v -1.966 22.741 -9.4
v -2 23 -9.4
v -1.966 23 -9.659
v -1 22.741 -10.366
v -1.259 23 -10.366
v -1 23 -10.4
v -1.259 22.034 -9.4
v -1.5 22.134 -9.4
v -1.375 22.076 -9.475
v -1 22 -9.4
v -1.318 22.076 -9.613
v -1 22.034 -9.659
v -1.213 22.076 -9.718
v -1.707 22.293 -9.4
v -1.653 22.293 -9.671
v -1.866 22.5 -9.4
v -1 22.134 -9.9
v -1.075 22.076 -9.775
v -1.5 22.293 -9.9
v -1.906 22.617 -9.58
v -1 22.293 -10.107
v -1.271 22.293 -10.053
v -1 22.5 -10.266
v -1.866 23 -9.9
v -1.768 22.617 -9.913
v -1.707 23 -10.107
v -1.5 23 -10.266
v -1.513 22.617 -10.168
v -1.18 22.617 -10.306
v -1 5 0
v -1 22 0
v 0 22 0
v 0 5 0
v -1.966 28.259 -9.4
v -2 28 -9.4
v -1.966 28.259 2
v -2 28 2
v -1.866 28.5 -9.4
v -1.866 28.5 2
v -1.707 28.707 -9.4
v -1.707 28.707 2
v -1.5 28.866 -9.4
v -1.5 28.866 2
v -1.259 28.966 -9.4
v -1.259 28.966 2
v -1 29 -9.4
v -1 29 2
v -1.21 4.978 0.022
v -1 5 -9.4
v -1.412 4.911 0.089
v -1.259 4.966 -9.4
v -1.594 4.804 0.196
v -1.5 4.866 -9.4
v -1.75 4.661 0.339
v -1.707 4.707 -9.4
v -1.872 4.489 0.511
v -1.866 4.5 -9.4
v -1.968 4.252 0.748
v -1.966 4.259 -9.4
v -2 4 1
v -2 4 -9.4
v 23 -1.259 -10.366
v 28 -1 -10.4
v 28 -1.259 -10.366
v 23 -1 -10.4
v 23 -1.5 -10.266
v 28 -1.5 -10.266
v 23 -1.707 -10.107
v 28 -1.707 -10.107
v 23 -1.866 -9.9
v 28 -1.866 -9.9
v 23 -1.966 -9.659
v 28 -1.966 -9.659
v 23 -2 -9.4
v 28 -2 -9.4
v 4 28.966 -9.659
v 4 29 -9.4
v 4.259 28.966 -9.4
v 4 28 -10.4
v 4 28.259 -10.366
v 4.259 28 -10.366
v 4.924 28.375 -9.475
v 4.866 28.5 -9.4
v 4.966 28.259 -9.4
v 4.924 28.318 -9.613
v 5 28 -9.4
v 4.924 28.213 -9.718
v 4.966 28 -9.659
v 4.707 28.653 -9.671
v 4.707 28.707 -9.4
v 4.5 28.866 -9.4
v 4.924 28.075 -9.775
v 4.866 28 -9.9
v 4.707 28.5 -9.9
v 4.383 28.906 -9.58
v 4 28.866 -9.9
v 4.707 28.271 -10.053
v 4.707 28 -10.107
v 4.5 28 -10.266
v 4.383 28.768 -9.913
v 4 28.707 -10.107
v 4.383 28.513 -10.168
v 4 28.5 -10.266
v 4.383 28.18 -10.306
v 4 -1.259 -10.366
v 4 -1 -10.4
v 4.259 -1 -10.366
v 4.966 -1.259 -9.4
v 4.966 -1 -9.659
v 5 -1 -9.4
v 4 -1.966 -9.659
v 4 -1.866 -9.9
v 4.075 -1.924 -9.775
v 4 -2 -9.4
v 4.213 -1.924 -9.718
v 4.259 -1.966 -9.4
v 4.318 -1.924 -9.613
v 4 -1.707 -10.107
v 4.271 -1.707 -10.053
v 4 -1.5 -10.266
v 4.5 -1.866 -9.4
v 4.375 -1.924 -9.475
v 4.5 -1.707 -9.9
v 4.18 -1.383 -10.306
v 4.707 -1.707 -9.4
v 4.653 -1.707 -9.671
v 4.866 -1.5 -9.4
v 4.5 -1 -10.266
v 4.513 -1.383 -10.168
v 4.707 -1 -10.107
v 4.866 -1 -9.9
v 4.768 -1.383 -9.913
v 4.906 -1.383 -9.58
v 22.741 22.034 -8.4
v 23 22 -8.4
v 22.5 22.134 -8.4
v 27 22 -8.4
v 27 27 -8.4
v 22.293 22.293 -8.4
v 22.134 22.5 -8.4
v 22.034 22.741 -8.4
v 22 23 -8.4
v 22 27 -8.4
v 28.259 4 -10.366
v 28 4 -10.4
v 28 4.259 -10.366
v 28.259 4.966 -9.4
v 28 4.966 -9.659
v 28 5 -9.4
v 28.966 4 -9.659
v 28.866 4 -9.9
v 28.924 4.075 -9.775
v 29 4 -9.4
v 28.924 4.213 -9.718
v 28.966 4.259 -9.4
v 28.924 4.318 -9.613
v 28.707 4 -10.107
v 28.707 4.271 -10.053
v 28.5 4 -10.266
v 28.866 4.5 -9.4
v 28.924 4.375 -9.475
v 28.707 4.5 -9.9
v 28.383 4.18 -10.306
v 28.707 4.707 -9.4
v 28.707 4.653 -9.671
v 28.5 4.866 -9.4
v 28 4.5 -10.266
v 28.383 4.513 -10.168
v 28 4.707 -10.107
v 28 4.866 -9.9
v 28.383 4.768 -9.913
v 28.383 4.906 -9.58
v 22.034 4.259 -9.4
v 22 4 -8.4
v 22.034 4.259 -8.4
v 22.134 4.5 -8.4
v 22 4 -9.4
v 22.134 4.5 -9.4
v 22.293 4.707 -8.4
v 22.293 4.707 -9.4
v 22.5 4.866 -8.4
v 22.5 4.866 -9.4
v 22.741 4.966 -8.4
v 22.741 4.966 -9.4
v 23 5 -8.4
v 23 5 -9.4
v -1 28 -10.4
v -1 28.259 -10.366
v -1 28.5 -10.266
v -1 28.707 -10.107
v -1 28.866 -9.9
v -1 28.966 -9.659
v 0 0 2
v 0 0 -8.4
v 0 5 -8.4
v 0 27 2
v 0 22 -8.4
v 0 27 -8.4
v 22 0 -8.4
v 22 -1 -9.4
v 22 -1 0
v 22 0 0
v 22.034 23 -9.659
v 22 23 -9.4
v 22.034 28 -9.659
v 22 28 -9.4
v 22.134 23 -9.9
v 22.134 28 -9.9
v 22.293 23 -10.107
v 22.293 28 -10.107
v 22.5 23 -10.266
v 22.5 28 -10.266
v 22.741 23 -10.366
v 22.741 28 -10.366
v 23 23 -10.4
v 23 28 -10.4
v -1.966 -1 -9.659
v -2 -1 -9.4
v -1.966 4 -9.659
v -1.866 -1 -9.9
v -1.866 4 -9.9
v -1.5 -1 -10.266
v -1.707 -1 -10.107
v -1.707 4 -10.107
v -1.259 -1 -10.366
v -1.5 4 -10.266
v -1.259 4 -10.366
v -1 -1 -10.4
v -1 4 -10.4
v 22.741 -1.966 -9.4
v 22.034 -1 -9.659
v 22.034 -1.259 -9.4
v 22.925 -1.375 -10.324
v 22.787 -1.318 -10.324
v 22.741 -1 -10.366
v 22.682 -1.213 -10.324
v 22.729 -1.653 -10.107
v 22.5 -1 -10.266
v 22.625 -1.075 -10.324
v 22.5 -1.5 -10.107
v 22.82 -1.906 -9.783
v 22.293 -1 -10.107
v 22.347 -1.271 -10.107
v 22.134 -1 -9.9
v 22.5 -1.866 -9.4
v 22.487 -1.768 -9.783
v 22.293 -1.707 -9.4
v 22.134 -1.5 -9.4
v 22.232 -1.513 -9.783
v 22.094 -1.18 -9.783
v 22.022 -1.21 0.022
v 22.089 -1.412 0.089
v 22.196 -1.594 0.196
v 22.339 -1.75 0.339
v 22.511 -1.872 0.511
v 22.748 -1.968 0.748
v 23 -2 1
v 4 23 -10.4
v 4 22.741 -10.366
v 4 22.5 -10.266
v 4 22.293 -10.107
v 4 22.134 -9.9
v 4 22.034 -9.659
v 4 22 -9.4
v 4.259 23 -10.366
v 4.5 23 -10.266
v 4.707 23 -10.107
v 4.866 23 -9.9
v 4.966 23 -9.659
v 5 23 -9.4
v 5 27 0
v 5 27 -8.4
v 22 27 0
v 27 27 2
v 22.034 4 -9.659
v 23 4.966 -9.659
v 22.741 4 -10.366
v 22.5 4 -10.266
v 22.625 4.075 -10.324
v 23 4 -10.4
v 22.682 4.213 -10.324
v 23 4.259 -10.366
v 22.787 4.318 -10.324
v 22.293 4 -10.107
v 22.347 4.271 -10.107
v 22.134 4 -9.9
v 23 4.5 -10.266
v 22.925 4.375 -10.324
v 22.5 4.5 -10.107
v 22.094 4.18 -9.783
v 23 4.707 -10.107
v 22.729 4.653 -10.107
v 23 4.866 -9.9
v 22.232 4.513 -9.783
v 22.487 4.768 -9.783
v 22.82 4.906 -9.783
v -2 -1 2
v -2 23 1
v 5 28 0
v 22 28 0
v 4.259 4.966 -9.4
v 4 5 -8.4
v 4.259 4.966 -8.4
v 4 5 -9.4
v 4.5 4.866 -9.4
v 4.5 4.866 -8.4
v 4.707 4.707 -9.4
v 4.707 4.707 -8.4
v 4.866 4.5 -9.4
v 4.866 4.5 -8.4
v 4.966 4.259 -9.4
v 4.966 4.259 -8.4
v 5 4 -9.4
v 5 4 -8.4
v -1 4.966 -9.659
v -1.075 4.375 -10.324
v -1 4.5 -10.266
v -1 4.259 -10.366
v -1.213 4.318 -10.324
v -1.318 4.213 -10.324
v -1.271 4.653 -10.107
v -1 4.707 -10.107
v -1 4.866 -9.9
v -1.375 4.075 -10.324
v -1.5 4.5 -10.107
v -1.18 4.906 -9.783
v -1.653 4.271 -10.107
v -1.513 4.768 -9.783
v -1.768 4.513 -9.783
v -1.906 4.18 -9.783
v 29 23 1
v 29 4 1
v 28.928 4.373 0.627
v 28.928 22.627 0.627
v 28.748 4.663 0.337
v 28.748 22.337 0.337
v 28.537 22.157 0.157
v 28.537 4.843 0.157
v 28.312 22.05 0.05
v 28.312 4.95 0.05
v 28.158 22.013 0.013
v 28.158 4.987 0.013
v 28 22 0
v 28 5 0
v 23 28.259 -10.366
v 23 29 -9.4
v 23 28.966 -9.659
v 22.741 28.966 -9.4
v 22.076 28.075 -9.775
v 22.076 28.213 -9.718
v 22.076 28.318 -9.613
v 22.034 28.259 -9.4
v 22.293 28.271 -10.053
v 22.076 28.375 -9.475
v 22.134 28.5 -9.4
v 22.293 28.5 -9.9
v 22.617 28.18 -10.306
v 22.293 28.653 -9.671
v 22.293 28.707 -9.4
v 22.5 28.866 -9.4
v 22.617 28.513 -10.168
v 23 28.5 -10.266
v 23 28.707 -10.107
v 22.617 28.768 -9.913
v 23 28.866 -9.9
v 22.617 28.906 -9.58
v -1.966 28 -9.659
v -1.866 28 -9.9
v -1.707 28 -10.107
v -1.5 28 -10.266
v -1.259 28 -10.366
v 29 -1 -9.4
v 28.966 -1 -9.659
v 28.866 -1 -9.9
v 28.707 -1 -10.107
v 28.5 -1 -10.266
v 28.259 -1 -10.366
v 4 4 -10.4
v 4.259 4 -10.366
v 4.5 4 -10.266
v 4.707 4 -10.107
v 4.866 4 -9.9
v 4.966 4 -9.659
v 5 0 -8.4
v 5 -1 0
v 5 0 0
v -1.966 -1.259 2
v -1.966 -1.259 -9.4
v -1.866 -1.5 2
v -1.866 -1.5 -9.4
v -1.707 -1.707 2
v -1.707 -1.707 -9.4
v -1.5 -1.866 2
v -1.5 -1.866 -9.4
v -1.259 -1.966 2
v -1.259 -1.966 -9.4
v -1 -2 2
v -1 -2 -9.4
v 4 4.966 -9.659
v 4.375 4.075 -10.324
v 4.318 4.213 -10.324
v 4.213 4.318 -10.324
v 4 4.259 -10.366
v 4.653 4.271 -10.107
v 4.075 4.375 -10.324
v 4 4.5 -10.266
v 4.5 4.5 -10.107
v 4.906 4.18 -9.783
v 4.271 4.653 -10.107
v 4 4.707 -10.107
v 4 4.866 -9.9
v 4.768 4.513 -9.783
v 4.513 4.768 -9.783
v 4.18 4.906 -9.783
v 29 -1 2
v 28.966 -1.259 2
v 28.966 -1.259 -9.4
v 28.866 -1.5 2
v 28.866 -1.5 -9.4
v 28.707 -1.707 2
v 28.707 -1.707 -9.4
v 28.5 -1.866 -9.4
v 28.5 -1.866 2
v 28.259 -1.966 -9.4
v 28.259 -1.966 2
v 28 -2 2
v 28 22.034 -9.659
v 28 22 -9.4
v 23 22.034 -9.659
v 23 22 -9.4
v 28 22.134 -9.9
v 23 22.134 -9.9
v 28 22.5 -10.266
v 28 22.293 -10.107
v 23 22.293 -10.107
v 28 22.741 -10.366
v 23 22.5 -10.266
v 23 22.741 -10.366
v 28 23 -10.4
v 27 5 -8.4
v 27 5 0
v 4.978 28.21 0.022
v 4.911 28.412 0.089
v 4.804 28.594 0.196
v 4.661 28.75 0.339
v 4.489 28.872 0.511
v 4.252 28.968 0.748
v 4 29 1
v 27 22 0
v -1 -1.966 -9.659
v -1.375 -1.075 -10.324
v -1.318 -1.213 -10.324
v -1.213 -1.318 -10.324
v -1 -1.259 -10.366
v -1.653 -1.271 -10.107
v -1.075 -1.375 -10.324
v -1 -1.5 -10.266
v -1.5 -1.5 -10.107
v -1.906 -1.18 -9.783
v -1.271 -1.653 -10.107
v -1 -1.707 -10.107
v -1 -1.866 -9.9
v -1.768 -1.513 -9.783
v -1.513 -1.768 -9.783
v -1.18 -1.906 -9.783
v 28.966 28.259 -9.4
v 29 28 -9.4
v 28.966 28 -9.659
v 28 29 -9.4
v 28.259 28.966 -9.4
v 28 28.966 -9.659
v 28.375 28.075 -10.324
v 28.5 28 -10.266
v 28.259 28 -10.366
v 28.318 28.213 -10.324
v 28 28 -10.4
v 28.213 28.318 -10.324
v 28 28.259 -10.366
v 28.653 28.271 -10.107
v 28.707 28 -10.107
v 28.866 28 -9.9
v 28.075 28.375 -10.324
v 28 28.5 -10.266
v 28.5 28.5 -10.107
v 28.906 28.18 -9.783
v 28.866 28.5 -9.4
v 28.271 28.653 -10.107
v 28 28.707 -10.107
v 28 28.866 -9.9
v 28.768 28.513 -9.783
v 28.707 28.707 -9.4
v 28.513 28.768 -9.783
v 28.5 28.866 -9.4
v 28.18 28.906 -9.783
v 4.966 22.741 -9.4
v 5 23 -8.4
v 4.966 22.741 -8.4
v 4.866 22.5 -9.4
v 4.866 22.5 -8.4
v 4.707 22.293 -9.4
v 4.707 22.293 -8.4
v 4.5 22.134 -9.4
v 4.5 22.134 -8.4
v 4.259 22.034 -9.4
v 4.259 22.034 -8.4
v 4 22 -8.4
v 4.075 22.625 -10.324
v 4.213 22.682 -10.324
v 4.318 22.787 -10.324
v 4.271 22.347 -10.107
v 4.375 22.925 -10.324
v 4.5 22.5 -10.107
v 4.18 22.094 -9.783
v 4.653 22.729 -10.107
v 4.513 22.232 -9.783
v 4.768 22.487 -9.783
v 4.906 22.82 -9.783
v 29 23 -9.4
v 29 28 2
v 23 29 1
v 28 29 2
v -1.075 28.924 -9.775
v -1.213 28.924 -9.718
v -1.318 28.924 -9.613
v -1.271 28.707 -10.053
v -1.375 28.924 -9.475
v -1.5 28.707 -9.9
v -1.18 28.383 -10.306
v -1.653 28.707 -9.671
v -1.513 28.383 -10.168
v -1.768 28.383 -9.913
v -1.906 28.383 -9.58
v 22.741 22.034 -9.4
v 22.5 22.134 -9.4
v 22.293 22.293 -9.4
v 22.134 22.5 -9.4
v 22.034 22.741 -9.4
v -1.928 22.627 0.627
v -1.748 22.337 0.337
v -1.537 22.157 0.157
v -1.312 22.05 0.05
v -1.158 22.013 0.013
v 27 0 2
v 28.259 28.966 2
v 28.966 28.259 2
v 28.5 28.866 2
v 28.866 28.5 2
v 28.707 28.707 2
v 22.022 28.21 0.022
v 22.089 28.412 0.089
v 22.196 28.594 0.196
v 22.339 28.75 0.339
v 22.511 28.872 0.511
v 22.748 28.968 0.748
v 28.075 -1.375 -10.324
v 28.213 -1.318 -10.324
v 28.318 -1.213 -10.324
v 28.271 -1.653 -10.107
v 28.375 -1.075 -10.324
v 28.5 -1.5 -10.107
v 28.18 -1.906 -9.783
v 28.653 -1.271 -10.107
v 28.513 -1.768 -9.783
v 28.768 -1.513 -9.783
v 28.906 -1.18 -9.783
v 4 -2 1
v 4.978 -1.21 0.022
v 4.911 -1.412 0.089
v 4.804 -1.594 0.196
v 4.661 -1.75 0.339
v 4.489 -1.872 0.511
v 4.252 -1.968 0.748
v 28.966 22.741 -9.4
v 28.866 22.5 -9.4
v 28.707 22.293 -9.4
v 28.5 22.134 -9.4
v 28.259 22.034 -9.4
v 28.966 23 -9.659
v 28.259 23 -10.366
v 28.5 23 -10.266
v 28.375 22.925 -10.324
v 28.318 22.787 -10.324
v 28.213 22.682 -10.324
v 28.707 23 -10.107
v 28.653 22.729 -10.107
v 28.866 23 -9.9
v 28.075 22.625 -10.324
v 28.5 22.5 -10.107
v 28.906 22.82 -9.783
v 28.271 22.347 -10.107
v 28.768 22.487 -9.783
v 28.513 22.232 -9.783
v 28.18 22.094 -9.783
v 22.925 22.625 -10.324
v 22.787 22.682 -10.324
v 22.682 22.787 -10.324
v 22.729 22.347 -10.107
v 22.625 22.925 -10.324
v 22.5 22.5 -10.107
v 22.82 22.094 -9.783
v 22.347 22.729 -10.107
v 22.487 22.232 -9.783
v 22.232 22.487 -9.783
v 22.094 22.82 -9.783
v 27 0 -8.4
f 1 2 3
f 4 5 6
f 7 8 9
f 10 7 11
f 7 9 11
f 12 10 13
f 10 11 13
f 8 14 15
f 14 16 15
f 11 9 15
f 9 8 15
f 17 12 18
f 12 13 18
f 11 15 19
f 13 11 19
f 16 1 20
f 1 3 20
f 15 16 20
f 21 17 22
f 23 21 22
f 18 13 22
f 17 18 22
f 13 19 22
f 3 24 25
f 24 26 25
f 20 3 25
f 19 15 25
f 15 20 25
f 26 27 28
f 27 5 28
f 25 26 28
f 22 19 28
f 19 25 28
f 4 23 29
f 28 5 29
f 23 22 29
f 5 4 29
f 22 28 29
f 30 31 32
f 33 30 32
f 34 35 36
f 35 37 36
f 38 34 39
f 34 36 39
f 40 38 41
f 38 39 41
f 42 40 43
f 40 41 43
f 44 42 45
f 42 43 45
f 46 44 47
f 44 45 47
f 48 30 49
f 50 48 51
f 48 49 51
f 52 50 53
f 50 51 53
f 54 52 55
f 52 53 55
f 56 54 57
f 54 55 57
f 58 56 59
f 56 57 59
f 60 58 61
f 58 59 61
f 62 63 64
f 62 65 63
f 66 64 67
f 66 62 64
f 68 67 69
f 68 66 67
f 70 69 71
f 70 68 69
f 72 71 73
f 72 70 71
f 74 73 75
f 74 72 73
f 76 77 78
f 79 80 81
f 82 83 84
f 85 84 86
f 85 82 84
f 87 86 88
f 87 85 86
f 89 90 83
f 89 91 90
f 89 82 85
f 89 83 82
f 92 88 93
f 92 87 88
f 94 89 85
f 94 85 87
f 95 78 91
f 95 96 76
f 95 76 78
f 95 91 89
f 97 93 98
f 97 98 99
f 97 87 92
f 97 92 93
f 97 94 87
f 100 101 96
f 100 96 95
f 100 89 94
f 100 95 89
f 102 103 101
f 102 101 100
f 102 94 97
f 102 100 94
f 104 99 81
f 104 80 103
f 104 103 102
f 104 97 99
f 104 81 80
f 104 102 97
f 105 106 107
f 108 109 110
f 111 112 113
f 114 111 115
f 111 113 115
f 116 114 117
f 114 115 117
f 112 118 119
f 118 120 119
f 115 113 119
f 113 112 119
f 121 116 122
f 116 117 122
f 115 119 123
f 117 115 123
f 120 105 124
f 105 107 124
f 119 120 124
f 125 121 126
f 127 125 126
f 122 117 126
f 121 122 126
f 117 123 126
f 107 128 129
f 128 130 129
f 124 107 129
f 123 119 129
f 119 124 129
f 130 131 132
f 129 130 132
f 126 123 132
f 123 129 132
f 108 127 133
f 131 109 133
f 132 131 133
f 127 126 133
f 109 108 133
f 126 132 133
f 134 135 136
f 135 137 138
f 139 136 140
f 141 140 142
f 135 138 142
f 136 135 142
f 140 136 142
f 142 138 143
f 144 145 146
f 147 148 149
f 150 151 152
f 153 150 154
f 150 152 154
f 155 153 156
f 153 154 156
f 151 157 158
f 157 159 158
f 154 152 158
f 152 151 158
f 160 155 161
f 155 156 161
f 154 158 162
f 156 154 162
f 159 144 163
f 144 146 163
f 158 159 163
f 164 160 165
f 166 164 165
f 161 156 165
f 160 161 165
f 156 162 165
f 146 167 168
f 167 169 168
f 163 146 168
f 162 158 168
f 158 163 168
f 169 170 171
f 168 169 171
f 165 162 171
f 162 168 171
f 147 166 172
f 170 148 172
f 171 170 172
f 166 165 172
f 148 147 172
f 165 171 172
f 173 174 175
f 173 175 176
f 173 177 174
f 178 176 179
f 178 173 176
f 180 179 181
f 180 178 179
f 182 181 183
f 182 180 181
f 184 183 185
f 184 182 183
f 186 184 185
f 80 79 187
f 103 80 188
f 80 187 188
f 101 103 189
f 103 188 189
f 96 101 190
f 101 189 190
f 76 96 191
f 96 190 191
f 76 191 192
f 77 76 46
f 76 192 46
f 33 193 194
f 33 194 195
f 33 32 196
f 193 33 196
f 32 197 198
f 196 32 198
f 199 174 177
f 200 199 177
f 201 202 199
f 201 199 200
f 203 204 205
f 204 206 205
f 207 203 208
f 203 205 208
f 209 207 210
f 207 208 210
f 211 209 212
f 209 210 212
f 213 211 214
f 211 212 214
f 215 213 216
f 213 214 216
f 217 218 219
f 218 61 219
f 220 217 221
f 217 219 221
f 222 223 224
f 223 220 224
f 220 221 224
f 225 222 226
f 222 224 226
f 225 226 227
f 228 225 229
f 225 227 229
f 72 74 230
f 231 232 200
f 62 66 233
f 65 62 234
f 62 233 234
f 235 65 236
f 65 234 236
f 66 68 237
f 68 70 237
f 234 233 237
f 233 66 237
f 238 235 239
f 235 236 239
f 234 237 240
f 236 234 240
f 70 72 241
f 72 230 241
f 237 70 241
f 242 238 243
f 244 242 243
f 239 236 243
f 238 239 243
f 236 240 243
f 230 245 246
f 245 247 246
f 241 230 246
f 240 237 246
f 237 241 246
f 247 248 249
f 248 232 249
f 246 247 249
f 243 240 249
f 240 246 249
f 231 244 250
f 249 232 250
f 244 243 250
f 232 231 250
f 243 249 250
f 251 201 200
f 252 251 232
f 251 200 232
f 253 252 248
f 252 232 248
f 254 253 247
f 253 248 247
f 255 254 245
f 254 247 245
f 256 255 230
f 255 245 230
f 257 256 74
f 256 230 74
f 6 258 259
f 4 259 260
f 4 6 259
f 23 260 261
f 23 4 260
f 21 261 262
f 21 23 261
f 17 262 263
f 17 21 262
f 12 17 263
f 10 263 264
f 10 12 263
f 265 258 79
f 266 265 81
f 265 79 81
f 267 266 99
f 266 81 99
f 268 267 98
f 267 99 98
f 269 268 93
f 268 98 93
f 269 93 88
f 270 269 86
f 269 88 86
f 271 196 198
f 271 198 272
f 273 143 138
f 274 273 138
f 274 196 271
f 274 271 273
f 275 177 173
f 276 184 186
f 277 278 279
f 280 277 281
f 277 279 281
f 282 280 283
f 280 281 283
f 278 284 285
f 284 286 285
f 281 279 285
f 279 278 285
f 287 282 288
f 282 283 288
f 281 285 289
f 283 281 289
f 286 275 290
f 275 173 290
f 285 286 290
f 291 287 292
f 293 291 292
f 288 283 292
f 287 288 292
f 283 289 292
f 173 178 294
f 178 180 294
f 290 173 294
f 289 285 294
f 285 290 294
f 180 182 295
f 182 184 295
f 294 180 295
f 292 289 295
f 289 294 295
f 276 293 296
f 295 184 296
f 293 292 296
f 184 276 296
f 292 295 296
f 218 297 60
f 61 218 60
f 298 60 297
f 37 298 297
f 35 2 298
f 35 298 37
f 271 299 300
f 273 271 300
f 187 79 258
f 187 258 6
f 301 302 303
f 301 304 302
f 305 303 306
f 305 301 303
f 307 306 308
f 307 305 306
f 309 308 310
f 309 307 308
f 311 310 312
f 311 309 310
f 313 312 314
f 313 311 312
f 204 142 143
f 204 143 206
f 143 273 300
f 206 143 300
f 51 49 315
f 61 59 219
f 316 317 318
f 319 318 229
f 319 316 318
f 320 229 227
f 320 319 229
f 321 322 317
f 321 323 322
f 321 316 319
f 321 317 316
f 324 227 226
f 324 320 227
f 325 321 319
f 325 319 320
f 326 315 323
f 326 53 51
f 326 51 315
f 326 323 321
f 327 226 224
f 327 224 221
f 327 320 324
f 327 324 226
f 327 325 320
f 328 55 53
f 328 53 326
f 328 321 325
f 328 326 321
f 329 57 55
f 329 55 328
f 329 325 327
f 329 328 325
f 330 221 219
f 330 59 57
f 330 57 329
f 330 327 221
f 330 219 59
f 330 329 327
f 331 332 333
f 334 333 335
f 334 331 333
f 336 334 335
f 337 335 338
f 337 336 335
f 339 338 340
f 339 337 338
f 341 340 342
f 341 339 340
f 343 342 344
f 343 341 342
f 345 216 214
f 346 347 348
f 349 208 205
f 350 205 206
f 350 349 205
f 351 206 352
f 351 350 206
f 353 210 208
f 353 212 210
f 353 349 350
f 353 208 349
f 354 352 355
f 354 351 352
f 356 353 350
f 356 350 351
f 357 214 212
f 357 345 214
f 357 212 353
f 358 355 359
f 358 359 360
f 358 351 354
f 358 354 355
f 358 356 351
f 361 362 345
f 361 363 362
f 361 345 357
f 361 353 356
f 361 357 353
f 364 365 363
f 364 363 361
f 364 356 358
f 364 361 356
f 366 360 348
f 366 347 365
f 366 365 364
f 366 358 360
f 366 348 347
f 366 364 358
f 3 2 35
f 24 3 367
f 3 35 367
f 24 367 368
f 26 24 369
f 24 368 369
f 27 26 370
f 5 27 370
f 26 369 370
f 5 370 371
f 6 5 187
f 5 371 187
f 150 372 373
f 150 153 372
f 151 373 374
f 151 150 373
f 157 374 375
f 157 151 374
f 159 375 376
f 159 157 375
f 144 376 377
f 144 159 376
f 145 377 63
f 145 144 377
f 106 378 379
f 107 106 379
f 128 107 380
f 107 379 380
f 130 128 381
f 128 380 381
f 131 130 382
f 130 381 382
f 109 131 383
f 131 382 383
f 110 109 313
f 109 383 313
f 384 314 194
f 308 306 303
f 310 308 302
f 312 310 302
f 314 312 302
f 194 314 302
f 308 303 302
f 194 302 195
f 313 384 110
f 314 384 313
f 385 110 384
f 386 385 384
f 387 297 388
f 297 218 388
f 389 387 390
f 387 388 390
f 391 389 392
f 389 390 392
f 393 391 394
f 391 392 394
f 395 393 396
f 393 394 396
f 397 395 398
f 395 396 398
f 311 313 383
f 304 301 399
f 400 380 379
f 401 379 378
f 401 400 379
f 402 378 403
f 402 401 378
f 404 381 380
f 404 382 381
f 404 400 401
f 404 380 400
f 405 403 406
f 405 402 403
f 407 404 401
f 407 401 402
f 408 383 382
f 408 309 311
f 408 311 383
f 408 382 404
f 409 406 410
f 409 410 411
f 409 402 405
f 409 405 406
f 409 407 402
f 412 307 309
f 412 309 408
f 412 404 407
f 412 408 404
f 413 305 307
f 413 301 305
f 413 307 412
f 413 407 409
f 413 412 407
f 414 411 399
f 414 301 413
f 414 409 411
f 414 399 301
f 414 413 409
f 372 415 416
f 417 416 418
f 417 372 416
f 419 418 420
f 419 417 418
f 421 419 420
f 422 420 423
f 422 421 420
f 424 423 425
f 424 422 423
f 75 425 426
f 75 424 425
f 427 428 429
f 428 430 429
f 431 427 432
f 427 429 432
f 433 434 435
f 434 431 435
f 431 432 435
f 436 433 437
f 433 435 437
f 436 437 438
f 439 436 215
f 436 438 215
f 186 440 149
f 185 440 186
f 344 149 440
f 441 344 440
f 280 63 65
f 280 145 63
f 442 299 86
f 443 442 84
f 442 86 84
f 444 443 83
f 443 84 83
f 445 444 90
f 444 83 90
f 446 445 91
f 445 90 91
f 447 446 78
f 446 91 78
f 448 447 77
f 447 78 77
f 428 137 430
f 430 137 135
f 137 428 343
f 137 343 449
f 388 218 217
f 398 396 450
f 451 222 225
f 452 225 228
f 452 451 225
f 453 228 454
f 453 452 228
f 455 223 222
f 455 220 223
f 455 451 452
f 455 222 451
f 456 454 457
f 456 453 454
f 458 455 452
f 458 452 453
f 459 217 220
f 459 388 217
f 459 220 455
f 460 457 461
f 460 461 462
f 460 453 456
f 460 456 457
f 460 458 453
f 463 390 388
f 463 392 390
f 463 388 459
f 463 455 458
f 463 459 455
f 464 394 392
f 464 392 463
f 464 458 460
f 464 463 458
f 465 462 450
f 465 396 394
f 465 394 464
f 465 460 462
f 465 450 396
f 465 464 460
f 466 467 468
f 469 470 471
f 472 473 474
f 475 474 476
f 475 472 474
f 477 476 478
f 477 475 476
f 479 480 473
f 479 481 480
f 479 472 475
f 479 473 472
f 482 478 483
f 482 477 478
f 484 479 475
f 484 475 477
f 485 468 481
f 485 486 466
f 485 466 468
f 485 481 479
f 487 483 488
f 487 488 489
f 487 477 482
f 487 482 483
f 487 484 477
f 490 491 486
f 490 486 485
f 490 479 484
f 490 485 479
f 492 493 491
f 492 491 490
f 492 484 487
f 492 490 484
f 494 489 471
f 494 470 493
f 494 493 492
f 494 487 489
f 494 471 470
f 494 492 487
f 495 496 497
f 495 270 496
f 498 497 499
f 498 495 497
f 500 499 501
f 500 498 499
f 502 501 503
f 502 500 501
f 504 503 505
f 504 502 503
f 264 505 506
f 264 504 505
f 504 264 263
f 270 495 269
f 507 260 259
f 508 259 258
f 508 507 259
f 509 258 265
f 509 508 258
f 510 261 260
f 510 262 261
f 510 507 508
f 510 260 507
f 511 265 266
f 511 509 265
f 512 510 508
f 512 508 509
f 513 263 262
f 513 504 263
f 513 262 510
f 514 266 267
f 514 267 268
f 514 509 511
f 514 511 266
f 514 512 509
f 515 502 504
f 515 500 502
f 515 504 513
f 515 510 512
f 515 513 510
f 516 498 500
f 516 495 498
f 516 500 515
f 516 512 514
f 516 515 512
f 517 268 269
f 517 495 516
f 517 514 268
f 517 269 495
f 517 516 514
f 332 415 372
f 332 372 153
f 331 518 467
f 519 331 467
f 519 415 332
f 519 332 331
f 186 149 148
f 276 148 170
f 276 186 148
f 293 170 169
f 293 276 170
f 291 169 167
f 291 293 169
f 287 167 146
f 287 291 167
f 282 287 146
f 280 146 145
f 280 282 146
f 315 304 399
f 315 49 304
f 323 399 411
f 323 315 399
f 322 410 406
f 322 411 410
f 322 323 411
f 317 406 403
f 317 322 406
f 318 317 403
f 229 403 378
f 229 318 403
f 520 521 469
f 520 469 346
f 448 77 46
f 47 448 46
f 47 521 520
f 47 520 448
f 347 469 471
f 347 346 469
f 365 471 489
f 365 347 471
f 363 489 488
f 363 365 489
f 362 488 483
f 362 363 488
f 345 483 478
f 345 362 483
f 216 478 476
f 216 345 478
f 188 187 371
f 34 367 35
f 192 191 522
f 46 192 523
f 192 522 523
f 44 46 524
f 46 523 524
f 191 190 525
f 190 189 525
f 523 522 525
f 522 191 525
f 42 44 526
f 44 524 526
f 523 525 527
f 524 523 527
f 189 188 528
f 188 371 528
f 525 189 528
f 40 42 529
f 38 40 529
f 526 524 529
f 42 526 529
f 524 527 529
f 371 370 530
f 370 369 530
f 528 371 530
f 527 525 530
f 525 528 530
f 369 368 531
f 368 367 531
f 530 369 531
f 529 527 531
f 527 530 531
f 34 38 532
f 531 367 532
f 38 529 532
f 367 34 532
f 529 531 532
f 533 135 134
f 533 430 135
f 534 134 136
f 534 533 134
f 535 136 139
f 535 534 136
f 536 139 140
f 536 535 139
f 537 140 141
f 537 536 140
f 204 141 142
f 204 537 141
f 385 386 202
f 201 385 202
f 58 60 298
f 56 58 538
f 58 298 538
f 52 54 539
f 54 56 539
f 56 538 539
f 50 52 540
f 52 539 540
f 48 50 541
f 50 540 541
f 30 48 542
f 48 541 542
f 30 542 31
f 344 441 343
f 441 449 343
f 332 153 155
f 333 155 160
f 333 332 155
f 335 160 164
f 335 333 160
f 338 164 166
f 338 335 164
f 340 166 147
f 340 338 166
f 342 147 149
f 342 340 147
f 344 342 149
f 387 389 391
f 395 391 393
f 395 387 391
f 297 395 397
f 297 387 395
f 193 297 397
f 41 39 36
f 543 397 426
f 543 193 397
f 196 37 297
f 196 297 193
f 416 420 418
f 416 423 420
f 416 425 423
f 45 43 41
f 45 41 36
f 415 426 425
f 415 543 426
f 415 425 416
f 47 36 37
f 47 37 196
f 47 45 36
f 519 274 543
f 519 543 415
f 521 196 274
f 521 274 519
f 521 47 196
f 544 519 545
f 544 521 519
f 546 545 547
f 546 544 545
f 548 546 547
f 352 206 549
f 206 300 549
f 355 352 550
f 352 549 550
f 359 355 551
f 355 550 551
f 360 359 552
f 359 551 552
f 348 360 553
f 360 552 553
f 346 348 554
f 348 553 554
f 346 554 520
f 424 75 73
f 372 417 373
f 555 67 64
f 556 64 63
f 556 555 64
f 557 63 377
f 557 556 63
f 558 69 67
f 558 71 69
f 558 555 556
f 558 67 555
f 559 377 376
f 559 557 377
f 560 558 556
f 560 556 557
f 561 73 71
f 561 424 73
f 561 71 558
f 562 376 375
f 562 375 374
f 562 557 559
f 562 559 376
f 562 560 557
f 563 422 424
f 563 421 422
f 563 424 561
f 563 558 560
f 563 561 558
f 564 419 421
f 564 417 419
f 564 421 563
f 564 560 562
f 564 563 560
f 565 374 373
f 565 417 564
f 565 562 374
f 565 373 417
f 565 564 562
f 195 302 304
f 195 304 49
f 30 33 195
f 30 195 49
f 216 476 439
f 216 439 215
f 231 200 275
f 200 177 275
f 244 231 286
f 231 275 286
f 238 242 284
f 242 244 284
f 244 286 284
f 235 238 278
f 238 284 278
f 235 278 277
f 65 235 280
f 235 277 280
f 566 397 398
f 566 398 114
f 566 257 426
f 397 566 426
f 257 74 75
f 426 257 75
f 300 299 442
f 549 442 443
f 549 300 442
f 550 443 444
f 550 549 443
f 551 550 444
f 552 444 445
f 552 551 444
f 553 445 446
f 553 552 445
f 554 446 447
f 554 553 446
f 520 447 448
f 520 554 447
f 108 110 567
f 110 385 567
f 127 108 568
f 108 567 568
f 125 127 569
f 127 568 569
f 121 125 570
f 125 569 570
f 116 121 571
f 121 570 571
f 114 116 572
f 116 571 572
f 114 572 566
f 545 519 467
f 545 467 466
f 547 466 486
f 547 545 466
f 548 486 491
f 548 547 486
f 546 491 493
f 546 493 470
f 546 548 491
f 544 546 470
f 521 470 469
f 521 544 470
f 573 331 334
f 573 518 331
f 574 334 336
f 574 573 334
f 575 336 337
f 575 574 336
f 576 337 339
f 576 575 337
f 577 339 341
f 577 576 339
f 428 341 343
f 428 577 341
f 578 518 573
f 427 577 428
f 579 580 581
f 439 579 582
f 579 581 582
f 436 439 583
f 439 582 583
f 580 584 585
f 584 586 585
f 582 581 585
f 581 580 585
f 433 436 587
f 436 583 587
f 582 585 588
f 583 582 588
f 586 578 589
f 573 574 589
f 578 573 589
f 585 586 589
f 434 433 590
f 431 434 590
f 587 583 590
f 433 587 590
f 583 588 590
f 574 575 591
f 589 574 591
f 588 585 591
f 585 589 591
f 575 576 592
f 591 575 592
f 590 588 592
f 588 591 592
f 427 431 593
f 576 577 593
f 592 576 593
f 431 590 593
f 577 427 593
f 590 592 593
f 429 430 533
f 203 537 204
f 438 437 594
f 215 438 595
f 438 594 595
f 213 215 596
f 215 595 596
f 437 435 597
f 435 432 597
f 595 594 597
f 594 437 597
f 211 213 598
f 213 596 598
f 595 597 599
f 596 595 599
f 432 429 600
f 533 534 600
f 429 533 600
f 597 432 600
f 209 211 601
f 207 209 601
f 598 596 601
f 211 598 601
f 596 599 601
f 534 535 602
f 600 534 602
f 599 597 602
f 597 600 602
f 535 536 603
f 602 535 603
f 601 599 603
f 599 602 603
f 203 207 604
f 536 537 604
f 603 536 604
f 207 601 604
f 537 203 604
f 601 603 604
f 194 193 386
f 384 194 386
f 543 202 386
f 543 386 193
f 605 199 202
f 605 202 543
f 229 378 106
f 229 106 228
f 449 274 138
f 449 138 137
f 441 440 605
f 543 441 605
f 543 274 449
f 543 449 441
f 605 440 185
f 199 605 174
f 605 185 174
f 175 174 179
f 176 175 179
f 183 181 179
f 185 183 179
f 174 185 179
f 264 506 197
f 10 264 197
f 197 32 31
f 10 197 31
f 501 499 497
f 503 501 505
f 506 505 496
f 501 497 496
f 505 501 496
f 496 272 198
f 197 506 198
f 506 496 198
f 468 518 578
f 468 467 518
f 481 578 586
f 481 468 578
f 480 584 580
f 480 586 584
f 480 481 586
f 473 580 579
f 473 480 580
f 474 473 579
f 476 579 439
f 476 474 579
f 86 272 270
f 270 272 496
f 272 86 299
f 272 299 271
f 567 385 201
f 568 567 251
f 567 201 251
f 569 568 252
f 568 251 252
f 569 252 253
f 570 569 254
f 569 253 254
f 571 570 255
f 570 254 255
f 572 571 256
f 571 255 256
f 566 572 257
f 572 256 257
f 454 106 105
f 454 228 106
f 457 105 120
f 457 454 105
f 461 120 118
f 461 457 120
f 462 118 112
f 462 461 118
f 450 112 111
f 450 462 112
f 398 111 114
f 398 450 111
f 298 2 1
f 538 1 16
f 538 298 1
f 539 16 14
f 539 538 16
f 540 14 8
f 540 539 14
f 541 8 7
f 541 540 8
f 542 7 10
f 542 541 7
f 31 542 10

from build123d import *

# Parameters (mm, degrees)
SKETCH1_W           = 31
SKETCH1_H           = 31
SKETCH1_W_2         = 27
SKETCH1_H_2         = 27
BOSS_EXTRUDE1_DEPTH = 2
BOSS_EXTRUDE2_DEPTH = 8.4
SKETCH4_W           = 7
SKETCH4_H           = 7
BOSS_EXTRUDE3_DEPTH = 2
FILLET1_R           = 1


with BuildPart() as part:
    # Sketch1 → Boss-Extrude1 (new body)
    with BuildSketch(Plane.XY):
        with Locations((13.5, 13.5)):
            Rectangle(SKETCH1_W, SKETCH1_H)
        with Locations((13.5, 13.5)):
            Rectangle(SKETCH1_W_2, SKETCH1_H_2, mode=Mode.SUBTRACT)
    extrude(amount=BOSS_EXTRUDE1_DEPTH)

    # Sketch2 → Boss-Extrude2 (add)
    with BuildSketch(Plane(origin=(0, 0, 0), x_dir=(-1, 0, 0), z_dir=(0, 0, -1))):
        Polygon((-29, 29), (-22, 29), (-22, 27), (-27, 27), (-27, 22), (-29, 22), align=None)
        Polygon((2, 29), (-5, 29), (-5, 27), (0, 27), (0, 22), (2, 22), align=None)
        Polygon((2, 5), (2, -2), (-5, -2), (-5, 0), (0, 0), (0, 5), align=None)
        Polygon((-29, -2), (-29, 5), (-27, 5), (-27, 0), (-22, 0), (-22, -2), align=None)
    extrude(amount=BOSS_EXTRUDE2_DEPTH)

    # Sketch4 → Boss-Extrude3 (add)
    with BuildSketch(Plane(origin=(0, 0, -8.4), x_dir=(-1, 0, 0), z_dir=(0, 0, -1))):
        with Locations((-25.5, 25.5)):
            Rectangle(SKETCH4_W, SKETCH4_H)
        with Locations((-25.5, 1.5)):
            Rectangle(SKETCH4_W, SKETCH4_H)
        with Locations((-1.5, 1.5)):
            Rectangle(SKETCH4_W, SKETCH4_H)
        with Locations((-1.5, 25.5)):
            Rectangle(SKETCH4_W, SKETCH4_H)
    extrude(amount=BOSS_EXTRUDE3_DEPTH)

    # Fillet1
    fillet1_edges = [part.edges().sort_by_distance(p)[0] for p in [
        (-2, 25.5, -10.4),
        (1.5, 29, -10.4),
        (-2, 29, -4.2),
        (-2, 22, -5.2),
        (5, 5, -9.4),
        (-2, 5, -5.2),
        (-2, 13.5, 0),
        (-2, -2, -4.2),
        (5, 1.5, -10.4),
        (1.5, 5, -10.4),
        (-2, 1.5, -10.4),
        (1.5, -2, -10.4),
        (5, -2, -5.2),
        (13.5, -2, 0),
        (22, 5, -9.4),
        (22, -2, -5.2),
        (29, -2, -4.2),
        (25.5, -2, -10.4),
        (22, 22, -9.4),
        (5, 22, -9.4),
        (22, 1.5, -10.4),
        (25.5, 5, -10.4),
        (29, 1.5, -10.4),
        (29, 5, -5.2),
        (29, 13.5, 0),
        (29, 29, -4.2),
        (29, 22, -5.2),
        (29, 25.5, -10.4),
        (25.5, 22, -10.4),
        (25.5, 29, -10.4),
        (22, 25.5, -10.4),
        (22, 29, -5.2),
        (13.5, 29, 0),
        (5, 29, -5.2),
        (1.5, 22, -10.4),
        (5, 25.5, -10.4),
    ]]
    fillet(fillet1_edges, radius=FILLET1_R)


solid = part.part
